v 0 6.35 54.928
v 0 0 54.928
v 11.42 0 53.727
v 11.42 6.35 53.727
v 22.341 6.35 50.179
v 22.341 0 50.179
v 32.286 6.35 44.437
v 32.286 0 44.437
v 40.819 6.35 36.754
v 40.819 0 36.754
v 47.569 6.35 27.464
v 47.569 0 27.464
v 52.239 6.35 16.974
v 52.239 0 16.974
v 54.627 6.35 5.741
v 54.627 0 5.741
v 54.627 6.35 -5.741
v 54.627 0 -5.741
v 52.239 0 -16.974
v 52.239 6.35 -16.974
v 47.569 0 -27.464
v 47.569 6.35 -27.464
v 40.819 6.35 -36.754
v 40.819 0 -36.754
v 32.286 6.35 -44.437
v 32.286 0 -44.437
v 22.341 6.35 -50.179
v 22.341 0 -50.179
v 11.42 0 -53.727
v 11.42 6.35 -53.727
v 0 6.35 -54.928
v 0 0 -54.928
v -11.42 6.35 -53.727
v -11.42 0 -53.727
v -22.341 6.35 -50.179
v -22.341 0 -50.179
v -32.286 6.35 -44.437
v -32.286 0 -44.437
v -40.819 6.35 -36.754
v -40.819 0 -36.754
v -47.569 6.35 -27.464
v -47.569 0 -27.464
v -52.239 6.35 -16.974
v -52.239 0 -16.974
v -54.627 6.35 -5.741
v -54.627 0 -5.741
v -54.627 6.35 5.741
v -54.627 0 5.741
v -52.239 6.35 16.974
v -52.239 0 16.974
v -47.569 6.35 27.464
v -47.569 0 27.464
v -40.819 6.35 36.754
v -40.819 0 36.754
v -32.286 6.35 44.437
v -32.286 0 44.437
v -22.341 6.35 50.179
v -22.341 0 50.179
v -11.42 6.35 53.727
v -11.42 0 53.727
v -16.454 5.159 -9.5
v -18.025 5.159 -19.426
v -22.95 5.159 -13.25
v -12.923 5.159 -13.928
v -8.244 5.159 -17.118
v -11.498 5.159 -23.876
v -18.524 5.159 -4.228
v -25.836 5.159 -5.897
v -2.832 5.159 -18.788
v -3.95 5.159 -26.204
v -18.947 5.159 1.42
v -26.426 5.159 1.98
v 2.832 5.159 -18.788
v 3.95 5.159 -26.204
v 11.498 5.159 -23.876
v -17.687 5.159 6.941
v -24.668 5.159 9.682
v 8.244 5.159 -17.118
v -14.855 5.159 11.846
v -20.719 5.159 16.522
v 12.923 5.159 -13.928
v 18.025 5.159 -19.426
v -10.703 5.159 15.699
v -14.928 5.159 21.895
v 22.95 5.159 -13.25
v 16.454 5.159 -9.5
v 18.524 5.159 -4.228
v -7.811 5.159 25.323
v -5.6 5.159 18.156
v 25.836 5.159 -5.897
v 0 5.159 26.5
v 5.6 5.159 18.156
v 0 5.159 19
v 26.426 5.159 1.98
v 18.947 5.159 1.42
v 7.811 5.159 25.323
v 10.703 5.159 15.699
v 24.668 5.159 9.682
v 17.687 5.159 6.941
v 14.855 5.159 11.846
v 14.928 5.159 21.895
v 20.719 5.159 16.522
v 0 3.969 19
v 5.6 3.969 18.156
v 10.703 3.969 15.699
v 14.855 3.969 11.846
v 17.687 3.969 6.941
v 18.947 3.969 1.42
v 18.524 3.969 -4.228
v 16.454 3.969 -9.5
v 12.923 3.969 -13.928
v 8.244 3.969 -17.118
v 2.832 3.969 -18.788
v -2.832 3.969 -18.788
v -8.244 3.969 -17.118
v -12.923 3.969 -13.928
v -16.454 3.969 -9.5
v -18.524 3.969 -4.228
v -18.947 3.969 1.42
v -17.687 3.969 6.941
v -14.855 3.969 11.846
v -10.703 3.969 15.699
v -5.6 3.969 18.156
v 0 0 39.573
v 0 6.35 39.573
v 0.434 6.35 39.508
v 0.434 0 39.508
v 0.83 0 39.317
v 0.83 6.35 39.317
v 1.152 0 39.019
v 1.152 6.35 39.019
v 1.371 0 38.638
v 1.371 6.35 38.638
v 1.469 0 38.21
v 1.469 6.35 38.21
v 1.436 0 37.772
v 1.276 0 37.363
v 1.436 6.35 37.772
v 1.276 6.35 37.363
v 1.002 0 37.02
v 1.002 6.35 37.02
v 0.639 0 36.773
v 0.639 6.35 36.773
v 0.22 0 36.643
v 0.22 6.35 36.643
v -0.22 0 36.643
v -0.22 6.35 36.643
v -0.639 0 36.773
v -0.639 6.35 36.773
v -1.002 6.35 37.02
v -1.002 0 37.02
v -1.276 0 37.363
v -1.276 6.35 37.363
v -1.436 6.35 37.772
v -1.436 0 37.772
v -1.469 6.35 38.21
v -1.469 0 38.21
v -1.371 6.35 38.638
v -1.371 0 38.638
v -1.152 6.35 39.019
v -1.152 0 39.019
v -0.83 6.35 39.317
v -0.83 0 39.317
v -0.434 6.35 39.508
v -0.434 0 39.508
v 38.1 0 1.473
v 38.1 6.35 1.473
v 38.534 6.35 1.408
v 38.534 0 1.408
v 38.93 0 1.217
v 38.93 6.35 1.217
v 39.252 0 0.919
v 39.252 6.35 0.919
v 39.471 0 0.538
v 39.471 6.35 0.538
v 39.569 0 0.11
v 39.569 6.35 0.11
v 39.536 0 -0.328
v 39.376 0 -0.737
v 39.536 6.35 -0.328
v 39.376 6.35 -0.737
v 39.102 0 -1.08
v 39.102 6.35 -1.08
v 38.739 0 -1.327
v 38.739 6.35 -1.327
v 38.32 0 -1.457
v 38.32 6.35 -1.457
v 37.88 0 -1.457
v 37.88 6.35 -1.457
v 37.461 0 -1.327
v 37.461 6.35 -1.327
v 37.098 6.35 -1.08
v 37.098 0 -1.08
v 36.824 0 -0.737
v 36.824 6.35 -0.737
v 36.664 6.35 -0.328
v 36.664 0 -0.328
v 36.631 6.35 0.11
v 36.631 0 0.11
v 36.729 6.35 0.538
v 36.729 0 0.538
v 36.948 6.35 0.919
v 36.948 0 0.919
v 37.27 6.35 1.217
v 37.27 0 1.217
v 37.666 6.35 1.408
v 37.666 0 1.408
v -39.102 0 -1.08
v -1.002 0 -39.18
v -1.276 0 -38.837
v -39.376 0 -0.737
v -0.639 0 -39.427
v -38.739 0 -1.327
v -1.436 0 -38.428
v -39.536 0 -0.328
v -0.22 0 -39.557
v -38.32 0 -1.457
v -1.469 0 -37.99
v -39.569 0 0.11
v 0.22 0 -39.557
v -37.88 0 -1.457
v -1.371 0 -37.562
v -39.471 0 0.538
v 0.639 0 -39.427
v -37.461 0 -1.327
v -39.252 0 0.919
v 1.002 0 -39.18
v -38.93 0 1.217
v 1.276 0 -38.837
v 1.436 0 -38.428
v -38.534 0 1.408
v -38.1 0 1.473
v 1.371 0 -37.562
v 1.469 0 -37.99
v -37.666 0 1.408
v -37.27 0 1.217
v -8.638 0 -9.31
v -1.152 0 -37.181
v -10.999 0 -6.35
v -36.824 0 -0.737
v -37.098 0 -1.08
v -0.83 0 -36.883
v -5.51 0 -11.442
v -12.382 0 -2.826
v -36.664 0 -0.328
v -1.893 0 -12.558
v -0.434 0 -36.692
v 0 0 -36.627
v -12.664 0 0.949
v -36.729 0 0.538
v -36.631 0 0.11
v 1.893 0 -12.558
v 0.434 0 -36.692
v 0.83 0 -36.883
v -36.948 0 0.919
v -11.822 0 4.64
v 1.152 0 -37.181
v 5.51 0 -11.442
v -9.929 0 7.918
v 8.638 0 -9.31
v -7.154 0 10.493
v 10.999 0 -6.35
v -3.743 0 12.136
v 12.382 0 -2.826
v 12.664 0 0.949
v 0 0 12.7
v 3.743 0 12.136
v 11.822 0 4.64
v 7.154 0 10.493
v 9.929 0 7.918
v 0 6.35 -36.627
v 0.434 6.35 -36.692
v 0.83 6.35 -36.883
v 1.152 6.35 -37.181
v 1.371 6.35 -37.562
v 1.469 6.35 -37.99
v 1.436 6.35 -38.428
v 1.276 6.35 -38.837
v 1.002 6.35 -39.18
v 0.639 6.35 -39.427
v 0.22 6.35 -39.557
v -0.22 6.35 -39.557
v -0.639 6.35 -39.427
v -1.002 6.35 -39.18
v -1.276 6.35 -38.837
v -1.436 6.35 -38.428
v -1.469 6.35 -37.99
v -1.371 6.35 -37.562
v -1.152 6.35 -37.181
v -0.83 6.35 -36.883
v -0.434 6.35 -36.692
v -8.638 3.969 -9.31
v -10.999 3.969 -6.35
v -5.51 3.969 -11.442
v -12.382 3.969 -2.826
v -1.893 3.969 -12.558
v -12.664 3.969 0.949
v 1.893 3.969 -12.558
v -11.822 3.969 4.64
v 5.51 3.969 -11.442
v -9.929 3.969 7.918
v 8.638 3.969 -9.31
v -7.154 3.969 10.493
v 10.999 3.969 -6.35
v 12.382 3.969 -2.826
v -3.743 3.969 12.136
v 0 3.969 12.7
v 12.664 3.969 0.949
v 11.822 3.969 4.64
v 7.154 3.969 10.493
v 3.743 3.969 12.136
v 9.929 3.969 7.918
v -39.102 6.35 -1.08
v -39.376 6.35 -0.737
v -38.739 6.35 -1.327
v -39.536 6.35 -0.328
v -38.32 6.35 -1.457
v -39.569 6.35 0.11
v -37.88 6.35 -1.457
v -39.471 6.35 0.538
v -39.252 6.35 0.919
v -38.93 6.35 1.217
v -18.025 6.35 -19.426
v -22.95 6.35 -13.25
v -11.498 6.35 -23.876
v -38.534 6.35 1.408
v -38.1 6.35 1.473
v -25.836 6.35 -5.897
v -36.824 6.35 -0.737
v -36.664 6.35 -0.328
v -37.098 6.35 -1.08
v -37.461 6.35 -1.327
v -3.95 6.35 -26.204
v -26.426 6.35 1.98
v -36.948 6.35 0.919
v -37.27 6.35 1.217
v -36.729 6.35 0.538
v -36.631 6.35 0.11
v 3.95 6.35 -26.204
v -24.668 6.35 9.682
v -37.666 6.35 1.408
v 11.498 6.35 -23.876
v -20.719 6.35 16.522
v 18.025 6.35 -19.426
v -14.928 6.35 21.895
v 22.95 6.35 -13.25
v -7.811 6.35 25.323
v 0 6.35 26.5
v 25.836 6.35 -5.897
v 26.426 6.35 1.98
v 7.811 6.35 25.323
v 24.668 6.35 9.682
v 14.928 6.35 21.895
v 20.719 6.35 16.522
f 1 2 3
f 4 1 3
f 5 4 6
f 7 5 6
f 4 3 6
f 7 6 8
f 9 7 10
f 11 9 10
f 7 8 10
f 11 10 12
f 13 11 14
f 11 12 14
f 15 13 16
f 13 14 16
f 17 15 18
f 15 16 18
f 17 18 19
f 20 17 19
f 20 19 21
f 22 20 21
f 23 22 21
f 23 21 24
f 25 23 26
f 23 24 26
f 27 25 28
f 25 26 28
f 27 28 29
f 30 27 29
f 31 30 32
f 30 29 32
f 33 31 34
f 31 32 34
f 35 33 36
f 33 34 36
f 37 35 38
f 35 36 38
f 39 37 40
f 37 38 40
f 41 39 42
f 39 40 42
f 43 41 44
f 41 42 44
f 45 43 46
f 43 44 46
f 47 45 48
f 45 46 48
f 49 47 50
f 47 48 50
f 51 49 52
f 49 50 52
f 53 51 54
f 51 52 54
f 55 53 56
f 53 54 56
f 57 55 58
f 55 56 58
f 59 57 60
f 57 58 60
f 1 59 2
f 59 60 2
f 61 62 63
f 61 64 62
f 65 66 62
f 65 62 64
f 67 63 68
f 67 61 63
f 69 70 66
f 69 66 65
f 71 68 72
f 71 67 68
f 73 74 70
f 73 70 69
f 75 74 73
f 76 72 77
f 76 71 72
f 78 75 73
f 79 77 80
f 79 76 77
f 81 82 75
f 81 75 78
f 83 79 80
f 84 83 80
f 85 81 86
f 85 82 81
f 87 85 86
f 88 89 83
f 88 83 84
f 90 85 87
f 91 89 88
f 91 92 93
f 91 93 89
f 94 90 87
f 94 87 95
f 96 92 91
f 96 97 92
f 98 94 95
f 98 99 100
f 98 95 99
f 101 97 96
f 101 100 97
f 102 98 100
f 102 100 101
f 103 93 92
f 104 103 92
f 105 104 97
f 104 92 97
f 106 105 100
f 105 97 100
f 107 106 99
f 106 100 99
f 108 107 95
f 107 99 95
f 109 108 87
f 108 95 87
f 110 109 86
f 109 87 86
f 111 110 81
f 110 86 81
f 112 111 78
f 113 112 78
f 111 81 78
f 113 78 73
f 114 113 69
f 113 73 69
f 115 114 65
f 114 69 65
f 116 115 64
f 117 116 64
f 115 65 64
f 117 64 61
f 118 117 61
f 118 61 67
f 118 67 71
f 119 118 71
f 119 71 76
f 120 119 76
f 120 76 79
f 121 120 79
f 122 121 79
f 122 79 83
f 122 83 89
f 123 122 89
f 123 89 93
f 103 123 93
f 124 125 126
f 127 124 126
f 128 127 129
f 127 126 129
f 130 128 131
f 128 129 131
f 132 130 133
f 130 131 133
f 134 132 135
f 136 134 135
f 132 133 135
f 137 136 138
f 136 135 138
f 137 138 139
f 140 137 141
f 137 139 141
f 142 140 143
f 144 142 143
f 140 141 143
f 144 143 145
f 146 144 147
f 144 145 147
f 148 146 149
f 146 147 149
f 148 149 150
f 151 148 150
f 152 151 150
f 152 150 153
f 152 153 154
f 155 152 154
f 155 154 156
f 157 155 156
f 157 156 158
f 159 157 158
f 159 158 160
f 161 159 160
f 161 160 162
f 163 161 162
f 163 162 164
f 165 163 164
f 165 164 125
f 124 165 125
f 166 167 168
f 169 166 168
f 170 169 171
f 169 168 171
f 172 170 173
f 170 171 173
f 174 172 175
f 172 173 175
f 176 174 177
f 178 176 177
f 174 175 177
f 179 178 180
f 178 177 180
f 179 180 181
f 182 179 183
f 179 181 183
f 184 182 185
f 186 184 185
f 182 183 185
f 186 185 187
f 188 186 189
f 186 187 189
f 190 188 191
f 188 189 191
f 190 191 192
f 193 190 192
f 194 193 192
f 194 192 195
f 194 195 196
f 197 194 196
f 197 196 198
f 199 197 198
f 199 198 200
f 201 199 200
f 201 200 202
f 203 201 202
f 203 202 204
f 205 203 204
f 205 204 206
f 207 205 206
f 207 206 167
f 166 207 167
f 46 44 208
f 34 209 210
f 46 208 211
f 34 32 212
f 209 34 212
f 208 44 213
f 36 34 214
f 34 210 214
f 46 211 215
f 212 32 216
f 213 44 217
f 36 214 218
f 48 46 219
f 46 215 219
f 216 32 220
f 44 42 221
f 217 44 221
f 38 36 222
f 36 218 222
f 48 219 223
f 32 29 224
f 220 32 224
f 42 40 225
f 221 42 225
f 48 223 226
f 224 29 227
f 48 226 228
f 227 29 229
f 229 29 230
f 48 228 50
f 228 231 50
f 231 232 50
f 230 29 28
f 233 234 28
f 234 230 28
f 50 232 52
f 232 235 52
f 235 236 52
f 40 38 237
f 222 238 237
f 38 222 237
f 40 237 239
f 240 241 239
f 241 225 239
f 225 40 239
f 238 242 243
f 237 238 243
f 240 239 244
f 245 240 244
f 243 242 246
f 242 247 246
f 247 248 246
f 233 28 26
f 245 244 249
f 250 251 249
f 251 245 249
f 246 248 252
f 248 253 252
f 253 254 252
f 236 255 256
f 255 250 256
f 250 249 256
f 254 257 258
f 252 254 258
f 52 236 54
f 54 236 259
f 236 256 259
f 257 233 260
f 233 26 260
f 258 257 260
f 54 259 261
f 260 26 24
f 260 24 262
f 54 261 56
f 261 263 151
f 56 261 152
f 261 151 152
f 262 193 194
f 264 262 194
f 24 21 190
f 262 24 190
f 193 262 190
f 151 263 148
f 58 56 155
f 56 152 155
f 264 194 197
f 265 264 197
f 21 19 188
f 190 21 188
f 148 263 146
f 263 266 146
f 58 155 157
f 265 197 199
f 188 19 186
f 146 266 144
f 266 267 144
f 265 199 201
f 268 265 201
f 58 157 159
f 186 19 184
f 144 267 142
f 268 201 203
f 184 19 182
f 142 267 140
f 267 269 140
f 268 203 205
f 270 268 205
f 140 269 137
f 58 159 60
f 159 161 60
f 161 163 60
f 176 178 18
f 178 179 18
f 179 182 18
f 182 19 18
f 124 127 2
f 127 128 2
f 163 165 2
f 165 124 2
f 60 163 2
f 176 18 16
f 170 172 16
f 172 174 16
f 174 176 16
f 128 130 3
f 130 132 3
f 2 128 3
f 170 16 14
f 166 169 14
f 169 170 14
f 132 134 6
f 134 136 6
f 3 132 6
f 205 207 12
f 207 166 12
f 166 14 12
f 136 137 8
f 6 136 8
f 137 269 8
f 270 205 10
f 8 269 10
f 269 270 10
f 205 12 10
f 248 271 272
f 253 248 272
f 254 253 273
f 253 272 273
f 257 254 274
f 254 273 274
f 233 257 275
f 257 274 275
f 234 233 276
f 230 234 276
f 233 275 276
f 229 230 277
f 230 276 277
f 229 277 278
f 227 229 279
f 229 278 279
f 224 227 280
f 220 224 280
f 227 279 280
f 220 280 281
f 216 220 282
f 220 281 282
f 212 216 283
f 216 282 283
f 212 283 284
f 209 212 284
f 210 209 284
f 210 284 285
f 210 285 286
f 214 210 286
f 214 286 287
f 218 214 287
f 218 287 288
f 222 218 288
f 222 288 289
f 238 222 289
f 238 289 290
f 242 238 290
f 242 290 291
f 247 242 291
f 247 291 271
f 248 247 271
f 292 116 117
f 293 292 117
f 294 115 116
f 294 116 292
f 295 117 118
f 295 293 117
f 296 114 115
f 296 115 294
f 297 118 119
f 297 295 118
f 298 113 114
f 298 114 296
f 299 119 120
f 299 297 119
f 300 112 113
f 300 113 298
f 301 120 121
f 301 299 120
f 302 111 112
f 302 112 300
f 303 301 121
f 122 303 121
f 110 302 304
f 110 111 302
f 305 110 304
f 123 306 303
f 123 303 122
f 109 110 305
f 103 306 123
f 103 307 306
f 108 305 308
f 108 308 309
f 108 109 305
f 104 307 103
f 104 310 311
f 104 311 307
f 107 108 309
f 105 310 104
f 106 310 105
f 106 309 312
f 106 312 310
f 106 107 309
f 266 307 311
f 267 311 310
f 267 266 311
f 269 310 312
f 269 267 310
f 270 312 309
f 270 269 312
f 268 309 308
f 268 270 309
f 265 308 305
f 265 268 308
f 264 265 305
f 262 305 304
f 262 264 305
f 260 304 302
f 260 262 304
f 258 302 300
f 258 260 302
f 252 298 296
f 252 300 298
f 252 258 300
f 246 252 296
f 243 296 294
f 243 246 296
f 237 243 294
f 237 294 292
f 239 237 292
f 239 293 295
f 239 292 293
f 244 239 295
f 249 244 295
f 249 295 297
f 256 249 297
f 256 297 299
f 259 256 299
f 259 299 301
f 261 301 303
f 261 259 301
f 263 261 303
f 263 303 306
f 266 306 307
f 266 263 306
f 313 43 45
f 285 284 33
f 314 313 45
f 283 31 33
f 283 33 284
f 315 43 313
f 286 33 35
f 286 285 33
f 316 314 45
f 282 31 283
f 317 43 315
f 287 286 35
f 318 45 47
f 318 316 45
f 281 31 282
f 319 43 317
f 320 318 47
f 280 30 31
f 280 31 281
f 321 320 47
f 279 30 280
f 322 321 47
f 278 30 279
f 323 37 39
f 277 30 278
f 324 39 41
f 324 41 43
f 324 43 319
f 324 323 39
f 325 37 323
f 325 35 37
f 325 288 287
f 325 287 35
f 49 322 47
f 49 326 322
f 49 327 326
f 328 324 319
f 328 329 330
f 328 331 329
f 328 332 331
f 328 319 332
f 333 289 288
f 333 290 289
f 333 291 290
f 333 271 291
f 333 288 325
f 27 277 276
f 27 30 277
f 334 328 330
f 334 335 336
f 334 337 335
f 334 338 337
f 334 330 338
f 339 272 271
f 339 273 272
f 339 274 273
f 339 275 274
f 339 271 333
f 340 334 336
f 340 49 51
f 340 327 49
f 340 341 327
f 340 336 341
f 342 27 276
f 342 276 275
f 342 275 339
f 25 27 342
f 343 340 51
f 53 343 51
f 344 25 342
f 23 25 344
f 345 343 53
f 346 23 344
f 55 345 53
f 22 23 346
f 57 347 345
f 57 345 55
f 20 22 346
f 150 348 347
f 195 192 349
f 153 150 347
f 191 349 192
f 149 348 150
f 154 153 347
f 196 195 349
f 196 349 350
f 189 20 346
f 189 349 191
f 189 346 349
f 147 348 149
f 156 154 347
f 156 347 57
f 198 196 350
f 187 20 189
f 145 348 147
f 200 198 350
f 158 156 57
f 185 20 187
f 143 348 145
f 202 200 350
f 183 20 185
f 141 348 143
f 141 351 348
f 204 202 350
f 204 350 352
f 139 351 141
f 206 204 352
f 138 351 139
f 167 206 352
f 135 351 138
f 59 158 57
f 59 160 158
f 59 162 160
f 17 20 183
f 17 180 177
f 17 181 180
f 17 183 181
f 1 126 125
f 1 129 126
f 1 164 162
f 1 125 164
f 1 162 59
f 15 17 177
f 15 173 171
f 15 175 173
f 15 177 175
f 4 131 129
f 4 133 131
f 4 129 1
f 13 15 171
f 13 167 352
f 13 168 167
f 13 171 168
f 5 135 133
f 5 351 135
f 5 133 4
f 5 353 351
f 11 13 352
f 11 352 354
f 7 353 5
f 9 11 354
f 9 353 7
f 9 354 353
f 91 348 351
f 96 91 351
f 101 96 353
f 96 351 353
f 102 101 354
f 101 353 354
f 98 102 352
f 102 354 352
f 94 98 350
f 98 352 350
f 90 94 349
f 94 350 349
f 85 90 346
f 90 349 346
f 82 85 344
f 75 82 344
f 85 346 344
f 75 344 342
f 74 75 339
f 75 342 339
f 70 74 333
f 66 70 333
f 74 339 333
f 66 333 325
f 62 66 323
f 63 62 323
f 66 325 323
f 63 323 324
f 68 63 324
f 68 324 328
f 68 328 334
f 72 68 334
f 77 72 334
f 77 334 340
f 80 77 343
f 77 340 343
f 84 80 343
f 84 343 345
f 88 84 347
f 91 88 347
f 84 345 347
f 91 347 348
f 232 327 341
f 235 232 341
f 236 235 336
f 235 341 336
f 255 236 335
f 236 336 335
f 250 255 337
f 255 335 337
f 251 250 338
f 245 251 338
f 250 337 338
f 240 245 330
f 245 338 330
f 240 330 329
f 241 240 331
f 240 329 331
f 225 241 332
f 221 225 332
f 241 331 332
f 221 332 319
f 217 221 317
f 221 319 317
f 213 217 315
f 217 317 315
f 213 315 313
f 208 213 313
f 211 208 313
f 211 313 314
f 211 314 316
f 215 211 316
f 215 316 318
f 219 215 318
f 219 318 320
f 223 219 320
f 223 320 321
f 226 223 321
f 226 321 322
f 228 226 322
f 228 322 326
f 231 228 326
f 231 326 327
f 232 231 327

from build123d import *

# Parameters (mm, degrees)
SKETCH1_R           = 54.9275
SKETCH1_R_2         = 12.7
BOSS_EXTRUDE1_DEPTH = 6.35
SKETCH2_R           = 26.5
CUT_EXTRUDE1_DEPTH  = 1.190625
SKETCH3_R           = 19
CUT_EXTRUDE2_DEPTH  = 2.38125
SKETCH4_R           = 1.4732
CUT_EXTRUDE3_DEPTH  = 7.35


with BuildPart() as part:
    # Sketch1 → Boss-Extrude1 (new body)
    with BuildSketch(Plane(origin=(0, 0, 0), x_dir=(1, 0, 0), z_dir=(0, 1, 0))):
        with Locations(Location((0, 0, 0), (0, 0, 270))):  # turned: the seam where the file's is
            Circle(SKETCH1_R)
        with Locations(Location((0, 0, 0), (0, 0, 270))):  # turned: the seam where the file's is
            Circle(SKETCH1_R_2, mode=Mode.SUBTRACT)
    extrude(amount=BOSS_EXTRUDE1_DEPTH)

    # Sketch2 → Cut-Extrude1 (cut)
    with BuildSketch(Plane(origin=(0, 6.35, 0), x_dir=(1, 0, 0), z_dir=(0, 1, 0))):
        with Locations(Location((0, 0, 0), (0, 0, 270))):  # turned: the seam where the file's is
            Circle(SKETCH2_R)
    extrude(amount=-CUT_EXTRUDE1_DEPTH, mode=Mode.SUBTRACT)

    # Sketch3 → Cut-Extrude2 (cut)
    with BuildSketch(Plane(origin=(0, 6.35, 0), x_dir=(1, 0, 0), z_dir=(0, 1, 0))):
        with Locations(Location((0, 0, 0), (0, 0, 270))):  # turned: the seam where the file's is
            Circle(SKETCH3_R)
    extrude(amount=-CUT_EXTRUDE2_DEPTH, mode=Mode.SUBTRACT)

    # Sketch4 → Cut-Extrude3 (cut, through all)
    with BuildSketch(Plane(origin=(0, 6.35, 0), x_dir=(-1, 0, 0), z_dir=(0, 1, 0))):
        with Locations(Location((-38.1, 0, 0), (0, 0, 90))):  # turned: the seam where the file's is
            Circle(SKETCH4_R)
        with Locations(Location((0, -38.1, 0), (0, 0, 90))):  # turned: the seam where the file's is
            Circle(SKETCH4_R)
        with Locations(Location((38.1, 0, 0), (0, 0, 90))):  # turned: the seam where the file's is
            Circle(SKETCH4_R)
        with Locations(Location((0, 38.1, 0), (0, 0, 90))):  # turned: the seam where the file's is
            Circle(SKETCH4_R)
    extrude(amount=-CUT_EXTRUDE3_DEPTH, mode=Mode.SUBTRACT)


solid = part.part
